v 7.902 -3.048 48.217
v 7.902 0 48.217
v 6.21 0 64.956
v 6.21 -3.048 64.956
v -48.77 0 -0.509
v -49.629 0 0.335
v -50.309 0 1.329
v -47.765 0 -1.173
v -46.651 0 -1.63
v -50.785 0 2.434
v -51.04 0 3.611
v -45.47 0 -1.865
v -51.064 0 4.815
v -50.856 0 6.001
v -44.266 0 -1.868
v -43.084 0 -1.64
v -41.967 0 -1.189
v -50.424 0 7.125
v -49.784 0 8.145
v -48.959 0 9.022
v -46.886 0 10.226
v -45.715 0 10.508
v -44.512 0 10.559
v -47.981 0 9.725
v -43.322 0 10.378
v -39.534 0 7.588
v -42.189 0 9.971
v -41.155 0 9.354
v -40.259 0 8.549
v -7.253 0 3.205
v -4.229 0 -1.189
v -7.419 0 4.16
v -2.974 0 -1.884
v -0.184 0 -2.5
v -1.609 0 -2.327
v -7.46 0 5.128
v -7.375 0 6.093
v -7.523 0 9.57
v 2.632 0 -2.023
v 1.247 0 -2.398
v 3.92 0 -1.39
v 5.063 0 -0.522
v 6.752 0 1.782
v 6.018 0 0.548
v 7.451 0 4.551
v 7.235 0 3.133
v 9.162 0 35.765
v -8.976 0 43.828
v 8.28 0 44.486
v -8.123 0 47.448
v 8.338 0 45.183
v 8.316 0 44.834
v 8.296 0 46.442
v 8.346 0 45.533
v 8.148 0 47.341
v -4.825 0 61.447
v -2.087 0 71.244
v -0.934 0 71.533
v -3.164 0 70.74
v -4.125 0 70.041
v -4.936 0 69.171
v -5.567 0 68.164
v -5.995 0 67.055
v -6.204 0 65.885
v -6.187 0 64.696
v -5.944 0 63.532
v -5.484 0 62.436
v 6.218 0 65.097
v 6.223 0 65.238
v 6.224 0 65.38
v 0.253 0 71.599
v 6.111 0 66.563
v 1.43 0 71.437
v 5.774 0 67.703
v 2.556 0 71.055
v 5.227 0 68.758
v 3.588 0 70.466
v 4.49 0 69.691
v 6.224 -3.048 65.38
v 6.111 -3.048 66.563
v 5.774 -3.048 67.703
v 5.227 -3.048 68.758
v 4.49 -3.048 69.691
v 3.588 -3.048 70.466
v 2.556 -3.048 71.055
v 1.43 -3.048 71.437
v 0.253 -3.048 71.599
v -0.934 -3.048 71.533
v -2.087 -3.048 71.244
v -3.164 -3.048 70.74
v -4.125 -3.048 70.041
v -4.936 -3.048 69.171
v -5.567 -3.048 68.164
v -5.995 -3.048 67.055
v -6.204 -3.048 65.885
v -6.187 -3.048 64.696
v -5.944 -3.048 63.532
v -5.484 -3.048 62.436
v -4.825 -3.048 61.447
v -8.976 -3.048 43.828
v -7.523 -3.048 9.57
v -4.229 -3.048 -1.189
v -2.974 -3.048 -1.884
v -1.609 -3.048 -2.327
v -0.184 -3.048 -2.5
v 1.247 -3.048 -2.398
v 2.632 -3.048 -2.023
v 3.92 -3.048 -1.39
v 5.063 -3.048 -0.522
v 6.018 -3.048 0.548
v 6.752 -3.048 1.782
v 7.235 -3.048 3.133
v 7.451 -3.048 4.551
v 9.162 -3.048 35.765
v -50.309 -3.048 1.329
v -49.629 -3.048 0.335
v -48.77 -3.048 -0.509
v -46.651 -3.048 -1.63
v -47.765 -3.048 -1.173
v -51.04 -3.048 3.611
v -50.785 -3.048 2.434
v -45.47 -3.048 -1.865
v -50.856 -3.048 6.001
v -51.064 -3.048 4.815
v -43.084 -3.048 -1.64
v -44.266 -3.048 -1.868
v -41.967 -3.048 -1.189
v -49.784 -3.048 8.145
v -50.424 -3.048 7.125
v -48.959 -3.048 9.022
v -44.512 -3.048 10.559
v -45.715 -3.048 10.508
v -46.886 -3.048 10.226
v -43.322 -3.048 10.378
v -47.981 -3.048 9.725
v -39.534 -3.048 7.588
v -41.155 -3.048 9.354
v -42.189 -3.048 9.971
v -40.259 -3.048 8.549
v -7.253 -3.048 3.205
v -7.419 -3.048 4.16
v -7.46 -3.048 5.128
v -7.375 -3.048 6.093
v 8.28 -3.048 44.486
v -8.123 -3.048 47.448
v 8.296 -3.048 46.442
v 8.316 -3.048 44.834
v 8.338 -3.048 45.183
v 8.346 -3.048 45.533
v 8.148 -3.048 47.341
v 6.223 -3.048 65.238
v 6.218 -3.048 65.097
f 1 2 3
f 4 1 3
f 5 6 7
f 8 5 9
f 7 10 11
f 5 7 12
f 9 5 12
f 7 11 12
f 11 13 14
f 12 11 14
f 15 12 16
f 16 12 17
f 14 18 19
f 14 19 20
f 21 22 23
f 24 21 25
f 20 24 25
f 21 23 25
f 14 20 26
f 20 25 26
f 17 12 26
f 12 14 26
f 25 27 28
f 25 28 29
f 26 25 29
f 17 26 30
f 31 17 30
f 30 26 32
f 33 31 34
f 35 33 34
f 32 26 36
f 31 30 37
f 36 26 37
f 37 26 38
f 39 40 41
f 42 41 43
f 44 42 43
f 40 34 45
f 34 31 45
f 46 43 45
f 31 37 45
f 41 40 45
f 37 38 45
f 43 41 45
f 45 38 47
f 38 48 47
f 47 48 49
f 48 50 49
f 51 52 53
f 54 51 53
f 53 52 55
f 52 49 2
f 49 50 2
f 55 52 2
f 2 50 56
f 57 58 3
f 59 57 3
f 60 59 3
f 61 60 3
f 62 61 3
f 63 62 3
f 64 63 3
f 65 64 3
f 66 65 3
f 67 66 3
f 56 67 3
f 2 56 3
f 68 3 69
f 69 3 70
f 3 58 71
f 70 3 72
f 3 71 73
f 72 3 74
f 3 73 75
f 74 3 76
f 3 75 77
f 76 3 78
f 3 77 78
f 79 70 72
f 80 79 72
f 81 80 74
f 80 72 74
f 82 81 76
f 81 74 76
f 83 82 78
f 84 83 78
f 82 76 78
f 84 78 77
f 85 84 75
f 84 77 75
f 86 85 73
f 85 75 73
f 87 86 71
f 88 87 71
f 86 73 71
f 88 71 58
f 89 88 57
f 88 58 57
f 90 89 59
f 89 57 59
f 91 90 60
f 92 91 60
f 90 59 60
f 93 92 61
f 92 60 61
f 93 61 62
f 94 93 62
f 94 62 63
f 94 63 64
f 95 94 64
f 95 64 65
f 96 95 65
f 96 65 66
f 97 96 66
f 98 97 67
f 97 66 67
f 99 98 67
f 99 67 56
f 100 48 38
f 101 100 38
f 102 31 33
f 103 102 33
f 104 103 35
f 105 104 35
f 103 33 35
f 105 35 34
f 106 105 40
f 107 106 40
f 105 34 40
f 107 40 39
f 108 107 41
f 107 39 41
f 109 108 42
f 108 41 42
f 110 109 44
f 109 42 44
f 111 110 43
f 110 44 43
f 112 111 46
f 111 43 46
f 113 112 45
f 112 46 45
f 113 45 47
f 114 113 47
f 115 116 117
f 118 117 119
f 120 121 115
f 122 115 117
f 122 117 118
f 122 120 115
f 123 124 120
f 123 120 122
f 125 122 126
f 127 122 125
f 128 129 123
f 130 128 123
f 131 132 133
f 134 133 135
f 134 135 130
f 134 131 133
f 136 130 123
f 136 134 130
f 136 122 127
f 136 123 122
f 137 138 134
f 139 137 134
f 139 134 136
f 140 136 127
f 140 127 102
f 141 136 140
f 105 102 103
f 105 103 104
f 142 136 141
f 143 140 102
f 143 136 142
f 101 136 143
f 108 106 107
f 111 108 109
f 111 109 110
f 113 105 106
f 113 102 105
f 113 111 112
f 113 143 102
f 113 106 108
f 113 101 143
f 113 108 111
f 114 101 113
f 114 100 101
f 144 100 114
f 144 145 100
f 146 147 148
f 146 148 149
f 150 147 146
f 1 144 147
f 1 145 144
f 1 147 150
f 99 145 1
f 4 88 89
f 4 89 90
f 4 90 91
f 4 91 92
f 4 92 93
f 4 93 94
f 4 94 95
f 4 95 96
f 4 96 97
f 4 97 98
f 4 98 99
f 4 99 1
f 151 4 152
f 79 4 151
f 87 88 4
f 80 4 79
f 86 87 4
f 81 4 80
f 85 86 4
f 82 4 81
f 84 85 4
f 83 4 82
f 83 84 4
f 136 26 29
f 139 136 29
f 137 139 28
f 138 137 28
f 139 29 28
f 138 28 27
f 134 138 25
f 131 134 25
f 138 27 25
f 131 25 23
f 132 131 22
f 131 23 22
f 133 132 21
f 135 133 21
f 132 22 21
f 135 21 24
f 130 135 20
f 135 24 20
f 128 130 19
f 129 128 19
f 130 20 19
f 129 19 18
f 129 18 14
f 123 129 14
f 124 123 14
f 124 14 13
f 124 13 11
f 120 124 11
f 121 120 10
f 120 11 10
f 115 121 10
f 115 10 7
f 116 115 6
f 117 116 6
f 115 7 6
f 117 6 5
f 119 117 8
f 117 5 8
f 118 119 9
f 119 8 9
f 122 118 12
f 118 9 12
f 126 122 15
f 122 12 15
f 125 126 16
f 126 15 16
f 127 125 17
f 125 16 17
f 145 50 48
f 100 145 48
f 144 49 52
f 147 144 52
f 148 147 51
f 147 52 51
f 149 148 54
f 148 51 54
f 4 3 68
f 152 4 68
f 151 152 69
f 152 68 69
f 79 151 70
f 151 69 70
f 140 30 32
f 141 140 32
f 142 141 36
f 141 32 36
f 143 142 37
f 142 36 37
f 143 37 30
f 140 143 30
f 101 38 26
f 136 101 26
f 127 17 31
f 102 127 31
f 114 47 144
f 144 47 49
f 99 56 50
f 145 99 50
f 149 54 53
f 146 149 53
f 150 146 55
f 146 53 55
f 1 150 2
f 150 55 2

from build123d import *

# Parameters (mm, degrees)
F1_DEPTH = 3.048


with BuildPart() as f1:
    # F0 (on Front) → F1 (new body)
    with BuildSketch(Plane.XZ):
        with BuildLine():
            ThreePointArc((6.209856088, 64.9557709646), (6.2206928765, 65.1675907882), (6.224306538, 65.3796568513))
            ThreePointArc((6.224306538, 65.3796568513), (-2.0871396142, 71.2436009258), (-4.824583776, 61.4470517012))
            ThreePointArc((-4.824583776, 61.4470517012), (-2.6706040451, 59.7573916572), (0, 59.1553503133))
            ThreePointArc((0, 59.1553503133), (4.2487407654, 60.8310093834), (6.209856088, 64.9557709646))
        make_face()
        with BuildLine():
            ThreePointArc((0, 59.1553503133), (-2.6706040451, 59.7573916572), (-4.824583776, 61.4470517012))
            Line((-4.824583776, 61.4470517012), (-8.1232850213, 47.4475871287))
            ThreePointArc((-8.1232850213, 47.4475871287), (-5.1805872599, 52.0766598943), (0, 53.8792414952))
            Line((0, 53.8792414952), (0, 59.1553503133))
        make_face()
        with BuildLine():
            Line((7.9024256694, 48.2173679334), (6.209856088, 64.9557709646))
            ThreePointArc((6.209856088, 64.9557709646), (4.2487407654, 60.8310093834), (0, 59.1553503133))
            Line((0, 59.1553503133), (0, 53.8792414952))
            ThreePointArc((0, 53.8792414952), (4.8606878035, 52.3176828203), (7.9024256694, 48.2173679334))
        make_face()
        with BuildLine():
            ThreePointArc((0, 53.8792414952), (-5.1805872599, 52.0766598943), (-8.1232850213, 47.4475871287))
            ThreePointArc((-8.1232850213, 47.4475871287), (-6.5431667331, 40.3529059013), (0, 37.1877448272))
            Line((0, 37.1877448272), (0, 53.8792414952))
        make_face()
        with BuildLine():
            ThreePointArc((0, 37.1877448272), (-6.5431667331, 40.3529059013), (-8.1232850213, 47.4475871287))
            Line((-8.1232850213, 47.4475871287), (-8.9761791751, 43.8279621303))
            Line((-8.9761791751, 43.8279621303), (-7.522948678, 9.569606592))
            Line((-7.522948678, 9.569606592), (-5.7813609054, 9.6774364228))
            ThreePointArc((-5.7813609054, 9.6774364228), (-3.1997914593, 11.7007529388), (0, 12.4216171046))
            Line((0, 12.4216171046), (0, 37.1877448272))
        make_face()
        with BuildLine():
            Line((8.2797434874, 44.4859421904), (7.9024256694, 48.2173679334))
            ThreePointArc((7.9024256694, 48.2173679334), (4.8606878035, 52.3176828203), (0, 53.8792414952))
            Line((0, 53.8792414952), (0, 37.1877448272))
            ThreePointArc((0, 37.1877448272), (5.5185559019, 39.2727379343), (8.2797434874, 44.4859421904))
        make_face()
        with BuildLine():
            ThreePointArc((8.345748334, 45.5334931612), (8.2341718199, 46.893614367), (7.9024256694, 48.2173679334))
            Line((7.9024256694, 48.2173679334), (8.2797434874, 44.4859421904))
            ThreePointArc((8.2797434874, 44.4859421904), (8.3292307769, 45.0086789855), (8.345748334, 45.5334931612))
        make_face()
        with BuildLine():
            ThreePointArc((8.2797434874, 44.4859421904), (5.5185559019, 39.2727379343), (0, 37.1877448272))
            Line((0, 37.1877448272), (0, 12.4216171046))
            ThreePointArc((0, 12.4216171046), (5.2764963843, 10.2360207404), (7.4620927485, 4.9595243561))
            ThreePointArc((7.4620927485, 4.9595243561), (7.4592970858, 4.7552814289), (7.4509121924, 4.5511915405))
            Line((7.4509121924, 4.5511915405), (9.1615496203, 35.7654578984))
            Line((9.1615496203, 35.7654578984), (8.2797434874, 44.4859421904))
        make_face()
        with BuildLine():
            ThreePointArc((7.4620927485, 4.9595243561), (5.2764963843, 10.2360207404), (0, 12.4216171046))
            ThreePointArc((0, 12.4216171046), (-3.1997914593, 11.7007529388), (-5.7813609054, 9.6774364228))
            ThreePointArc((-5.7813609054, 9.6774364228), (-6.8181639984, 7.9919273436), (-7.3754788979, 6.0931641639))
            Line((-7.3754788979, 6.0931641639), (-7.2529785413, 3.2053492032))
            ThreePointArc((-7.2529785413, 3.2053492032), (-6.1468484582, 0.7287936603), (-4.2285927984, -1.1887950186))
            ThreePointArc((-4.2285927984, -1.1887950186), (3.2913062747, -1.737499699), (7.4509121924, 4.5511915405))
            ThreePointArc((7.4509121924, 4.5511915405), (7.4592970858, 4.7552814289), (7.4620927485, 4.9595243561))
        make_face()
        with BuildLine():
            Line((-5.7813609054, 9.6774364228), (-7.522948678, 9.569606592))
            Line((-7.522948678, 9.569606592), (-7.3754788979, 6.0931641639))
            ThreePointArc((-7.3754788979, 6.0931641639), (-6.8181639984, 7.9919273436), (-5.7813609054, 9.6774364228))
        make_face()
        with BuildLine():
            Line((-7.3754788979, 6.0931641639), (-7.522948678, 9.569606592))
            Line((-7.522948678, 9.569606592), (-39.5340041513, 7.5876526823))
            ThreePointArc((-39.5340041513, 7.5876526823), (-38.8517853204, 6.0251107225), (-38.6185603593, 4.3361566003))
            ThreePointArc((-38.6185603593, 4.3361566003), (-38.6444768889, 3.7683918186), (-38.7220109269, 3.2053492032))
            Line((-38.7220109269, 3.2053492032), (-7.2529785413, 3.2053492032))
            ThreePointArc((-7.2529785413, 3.2053492032), (-7.4553880231, 4.6432687427), (-7.3754788979, 6.0931641639))
        make_face()
        with BuildLine():
            ThreePointArc((-38.6185603593, 4.3361566003), (-38.8517853204, 6.0251107225), (-39.5340041513, 7.5876526823))
            ThreePointArc((-39.5340041513, 7.5876526823), (-50.8562066327, 6.0011927176), (-41.9672696546, -1.1887950186))
            ThreePointArc((-41.9672696546, -1.1887950186), (-39.8375427183, 0.6337643909), (-38.7220109269, 3.2053492032))
            ThreePointArc((-38.7220109269, 3.2053492032), (-38.6444768889, 3.7683918186), (-38.6185603593, 4.3361566003))
        make_face()
        with BuildLine():
            ThreePointArc((-4.2285927984, -1.1887950186), (-6.1468484582, 0.7287936603), (-7.2529785413, 3.2053492032))
            Line((-7.2529785413, 3.2053492032), (-38.7220109269, 3.2053492032))
            ThreePointArc((-38.7220109269, 3.2053492032), (-39.8375427183, 0.6337643909), (-41.9672696546, -1.1887950186))
            Line((-41.9672696546, -1.1887950186), (-4.2285927984, -1.1887950186))
        make_face()
    extrude(amount=F1_DEPTH)


solid = f1.part
